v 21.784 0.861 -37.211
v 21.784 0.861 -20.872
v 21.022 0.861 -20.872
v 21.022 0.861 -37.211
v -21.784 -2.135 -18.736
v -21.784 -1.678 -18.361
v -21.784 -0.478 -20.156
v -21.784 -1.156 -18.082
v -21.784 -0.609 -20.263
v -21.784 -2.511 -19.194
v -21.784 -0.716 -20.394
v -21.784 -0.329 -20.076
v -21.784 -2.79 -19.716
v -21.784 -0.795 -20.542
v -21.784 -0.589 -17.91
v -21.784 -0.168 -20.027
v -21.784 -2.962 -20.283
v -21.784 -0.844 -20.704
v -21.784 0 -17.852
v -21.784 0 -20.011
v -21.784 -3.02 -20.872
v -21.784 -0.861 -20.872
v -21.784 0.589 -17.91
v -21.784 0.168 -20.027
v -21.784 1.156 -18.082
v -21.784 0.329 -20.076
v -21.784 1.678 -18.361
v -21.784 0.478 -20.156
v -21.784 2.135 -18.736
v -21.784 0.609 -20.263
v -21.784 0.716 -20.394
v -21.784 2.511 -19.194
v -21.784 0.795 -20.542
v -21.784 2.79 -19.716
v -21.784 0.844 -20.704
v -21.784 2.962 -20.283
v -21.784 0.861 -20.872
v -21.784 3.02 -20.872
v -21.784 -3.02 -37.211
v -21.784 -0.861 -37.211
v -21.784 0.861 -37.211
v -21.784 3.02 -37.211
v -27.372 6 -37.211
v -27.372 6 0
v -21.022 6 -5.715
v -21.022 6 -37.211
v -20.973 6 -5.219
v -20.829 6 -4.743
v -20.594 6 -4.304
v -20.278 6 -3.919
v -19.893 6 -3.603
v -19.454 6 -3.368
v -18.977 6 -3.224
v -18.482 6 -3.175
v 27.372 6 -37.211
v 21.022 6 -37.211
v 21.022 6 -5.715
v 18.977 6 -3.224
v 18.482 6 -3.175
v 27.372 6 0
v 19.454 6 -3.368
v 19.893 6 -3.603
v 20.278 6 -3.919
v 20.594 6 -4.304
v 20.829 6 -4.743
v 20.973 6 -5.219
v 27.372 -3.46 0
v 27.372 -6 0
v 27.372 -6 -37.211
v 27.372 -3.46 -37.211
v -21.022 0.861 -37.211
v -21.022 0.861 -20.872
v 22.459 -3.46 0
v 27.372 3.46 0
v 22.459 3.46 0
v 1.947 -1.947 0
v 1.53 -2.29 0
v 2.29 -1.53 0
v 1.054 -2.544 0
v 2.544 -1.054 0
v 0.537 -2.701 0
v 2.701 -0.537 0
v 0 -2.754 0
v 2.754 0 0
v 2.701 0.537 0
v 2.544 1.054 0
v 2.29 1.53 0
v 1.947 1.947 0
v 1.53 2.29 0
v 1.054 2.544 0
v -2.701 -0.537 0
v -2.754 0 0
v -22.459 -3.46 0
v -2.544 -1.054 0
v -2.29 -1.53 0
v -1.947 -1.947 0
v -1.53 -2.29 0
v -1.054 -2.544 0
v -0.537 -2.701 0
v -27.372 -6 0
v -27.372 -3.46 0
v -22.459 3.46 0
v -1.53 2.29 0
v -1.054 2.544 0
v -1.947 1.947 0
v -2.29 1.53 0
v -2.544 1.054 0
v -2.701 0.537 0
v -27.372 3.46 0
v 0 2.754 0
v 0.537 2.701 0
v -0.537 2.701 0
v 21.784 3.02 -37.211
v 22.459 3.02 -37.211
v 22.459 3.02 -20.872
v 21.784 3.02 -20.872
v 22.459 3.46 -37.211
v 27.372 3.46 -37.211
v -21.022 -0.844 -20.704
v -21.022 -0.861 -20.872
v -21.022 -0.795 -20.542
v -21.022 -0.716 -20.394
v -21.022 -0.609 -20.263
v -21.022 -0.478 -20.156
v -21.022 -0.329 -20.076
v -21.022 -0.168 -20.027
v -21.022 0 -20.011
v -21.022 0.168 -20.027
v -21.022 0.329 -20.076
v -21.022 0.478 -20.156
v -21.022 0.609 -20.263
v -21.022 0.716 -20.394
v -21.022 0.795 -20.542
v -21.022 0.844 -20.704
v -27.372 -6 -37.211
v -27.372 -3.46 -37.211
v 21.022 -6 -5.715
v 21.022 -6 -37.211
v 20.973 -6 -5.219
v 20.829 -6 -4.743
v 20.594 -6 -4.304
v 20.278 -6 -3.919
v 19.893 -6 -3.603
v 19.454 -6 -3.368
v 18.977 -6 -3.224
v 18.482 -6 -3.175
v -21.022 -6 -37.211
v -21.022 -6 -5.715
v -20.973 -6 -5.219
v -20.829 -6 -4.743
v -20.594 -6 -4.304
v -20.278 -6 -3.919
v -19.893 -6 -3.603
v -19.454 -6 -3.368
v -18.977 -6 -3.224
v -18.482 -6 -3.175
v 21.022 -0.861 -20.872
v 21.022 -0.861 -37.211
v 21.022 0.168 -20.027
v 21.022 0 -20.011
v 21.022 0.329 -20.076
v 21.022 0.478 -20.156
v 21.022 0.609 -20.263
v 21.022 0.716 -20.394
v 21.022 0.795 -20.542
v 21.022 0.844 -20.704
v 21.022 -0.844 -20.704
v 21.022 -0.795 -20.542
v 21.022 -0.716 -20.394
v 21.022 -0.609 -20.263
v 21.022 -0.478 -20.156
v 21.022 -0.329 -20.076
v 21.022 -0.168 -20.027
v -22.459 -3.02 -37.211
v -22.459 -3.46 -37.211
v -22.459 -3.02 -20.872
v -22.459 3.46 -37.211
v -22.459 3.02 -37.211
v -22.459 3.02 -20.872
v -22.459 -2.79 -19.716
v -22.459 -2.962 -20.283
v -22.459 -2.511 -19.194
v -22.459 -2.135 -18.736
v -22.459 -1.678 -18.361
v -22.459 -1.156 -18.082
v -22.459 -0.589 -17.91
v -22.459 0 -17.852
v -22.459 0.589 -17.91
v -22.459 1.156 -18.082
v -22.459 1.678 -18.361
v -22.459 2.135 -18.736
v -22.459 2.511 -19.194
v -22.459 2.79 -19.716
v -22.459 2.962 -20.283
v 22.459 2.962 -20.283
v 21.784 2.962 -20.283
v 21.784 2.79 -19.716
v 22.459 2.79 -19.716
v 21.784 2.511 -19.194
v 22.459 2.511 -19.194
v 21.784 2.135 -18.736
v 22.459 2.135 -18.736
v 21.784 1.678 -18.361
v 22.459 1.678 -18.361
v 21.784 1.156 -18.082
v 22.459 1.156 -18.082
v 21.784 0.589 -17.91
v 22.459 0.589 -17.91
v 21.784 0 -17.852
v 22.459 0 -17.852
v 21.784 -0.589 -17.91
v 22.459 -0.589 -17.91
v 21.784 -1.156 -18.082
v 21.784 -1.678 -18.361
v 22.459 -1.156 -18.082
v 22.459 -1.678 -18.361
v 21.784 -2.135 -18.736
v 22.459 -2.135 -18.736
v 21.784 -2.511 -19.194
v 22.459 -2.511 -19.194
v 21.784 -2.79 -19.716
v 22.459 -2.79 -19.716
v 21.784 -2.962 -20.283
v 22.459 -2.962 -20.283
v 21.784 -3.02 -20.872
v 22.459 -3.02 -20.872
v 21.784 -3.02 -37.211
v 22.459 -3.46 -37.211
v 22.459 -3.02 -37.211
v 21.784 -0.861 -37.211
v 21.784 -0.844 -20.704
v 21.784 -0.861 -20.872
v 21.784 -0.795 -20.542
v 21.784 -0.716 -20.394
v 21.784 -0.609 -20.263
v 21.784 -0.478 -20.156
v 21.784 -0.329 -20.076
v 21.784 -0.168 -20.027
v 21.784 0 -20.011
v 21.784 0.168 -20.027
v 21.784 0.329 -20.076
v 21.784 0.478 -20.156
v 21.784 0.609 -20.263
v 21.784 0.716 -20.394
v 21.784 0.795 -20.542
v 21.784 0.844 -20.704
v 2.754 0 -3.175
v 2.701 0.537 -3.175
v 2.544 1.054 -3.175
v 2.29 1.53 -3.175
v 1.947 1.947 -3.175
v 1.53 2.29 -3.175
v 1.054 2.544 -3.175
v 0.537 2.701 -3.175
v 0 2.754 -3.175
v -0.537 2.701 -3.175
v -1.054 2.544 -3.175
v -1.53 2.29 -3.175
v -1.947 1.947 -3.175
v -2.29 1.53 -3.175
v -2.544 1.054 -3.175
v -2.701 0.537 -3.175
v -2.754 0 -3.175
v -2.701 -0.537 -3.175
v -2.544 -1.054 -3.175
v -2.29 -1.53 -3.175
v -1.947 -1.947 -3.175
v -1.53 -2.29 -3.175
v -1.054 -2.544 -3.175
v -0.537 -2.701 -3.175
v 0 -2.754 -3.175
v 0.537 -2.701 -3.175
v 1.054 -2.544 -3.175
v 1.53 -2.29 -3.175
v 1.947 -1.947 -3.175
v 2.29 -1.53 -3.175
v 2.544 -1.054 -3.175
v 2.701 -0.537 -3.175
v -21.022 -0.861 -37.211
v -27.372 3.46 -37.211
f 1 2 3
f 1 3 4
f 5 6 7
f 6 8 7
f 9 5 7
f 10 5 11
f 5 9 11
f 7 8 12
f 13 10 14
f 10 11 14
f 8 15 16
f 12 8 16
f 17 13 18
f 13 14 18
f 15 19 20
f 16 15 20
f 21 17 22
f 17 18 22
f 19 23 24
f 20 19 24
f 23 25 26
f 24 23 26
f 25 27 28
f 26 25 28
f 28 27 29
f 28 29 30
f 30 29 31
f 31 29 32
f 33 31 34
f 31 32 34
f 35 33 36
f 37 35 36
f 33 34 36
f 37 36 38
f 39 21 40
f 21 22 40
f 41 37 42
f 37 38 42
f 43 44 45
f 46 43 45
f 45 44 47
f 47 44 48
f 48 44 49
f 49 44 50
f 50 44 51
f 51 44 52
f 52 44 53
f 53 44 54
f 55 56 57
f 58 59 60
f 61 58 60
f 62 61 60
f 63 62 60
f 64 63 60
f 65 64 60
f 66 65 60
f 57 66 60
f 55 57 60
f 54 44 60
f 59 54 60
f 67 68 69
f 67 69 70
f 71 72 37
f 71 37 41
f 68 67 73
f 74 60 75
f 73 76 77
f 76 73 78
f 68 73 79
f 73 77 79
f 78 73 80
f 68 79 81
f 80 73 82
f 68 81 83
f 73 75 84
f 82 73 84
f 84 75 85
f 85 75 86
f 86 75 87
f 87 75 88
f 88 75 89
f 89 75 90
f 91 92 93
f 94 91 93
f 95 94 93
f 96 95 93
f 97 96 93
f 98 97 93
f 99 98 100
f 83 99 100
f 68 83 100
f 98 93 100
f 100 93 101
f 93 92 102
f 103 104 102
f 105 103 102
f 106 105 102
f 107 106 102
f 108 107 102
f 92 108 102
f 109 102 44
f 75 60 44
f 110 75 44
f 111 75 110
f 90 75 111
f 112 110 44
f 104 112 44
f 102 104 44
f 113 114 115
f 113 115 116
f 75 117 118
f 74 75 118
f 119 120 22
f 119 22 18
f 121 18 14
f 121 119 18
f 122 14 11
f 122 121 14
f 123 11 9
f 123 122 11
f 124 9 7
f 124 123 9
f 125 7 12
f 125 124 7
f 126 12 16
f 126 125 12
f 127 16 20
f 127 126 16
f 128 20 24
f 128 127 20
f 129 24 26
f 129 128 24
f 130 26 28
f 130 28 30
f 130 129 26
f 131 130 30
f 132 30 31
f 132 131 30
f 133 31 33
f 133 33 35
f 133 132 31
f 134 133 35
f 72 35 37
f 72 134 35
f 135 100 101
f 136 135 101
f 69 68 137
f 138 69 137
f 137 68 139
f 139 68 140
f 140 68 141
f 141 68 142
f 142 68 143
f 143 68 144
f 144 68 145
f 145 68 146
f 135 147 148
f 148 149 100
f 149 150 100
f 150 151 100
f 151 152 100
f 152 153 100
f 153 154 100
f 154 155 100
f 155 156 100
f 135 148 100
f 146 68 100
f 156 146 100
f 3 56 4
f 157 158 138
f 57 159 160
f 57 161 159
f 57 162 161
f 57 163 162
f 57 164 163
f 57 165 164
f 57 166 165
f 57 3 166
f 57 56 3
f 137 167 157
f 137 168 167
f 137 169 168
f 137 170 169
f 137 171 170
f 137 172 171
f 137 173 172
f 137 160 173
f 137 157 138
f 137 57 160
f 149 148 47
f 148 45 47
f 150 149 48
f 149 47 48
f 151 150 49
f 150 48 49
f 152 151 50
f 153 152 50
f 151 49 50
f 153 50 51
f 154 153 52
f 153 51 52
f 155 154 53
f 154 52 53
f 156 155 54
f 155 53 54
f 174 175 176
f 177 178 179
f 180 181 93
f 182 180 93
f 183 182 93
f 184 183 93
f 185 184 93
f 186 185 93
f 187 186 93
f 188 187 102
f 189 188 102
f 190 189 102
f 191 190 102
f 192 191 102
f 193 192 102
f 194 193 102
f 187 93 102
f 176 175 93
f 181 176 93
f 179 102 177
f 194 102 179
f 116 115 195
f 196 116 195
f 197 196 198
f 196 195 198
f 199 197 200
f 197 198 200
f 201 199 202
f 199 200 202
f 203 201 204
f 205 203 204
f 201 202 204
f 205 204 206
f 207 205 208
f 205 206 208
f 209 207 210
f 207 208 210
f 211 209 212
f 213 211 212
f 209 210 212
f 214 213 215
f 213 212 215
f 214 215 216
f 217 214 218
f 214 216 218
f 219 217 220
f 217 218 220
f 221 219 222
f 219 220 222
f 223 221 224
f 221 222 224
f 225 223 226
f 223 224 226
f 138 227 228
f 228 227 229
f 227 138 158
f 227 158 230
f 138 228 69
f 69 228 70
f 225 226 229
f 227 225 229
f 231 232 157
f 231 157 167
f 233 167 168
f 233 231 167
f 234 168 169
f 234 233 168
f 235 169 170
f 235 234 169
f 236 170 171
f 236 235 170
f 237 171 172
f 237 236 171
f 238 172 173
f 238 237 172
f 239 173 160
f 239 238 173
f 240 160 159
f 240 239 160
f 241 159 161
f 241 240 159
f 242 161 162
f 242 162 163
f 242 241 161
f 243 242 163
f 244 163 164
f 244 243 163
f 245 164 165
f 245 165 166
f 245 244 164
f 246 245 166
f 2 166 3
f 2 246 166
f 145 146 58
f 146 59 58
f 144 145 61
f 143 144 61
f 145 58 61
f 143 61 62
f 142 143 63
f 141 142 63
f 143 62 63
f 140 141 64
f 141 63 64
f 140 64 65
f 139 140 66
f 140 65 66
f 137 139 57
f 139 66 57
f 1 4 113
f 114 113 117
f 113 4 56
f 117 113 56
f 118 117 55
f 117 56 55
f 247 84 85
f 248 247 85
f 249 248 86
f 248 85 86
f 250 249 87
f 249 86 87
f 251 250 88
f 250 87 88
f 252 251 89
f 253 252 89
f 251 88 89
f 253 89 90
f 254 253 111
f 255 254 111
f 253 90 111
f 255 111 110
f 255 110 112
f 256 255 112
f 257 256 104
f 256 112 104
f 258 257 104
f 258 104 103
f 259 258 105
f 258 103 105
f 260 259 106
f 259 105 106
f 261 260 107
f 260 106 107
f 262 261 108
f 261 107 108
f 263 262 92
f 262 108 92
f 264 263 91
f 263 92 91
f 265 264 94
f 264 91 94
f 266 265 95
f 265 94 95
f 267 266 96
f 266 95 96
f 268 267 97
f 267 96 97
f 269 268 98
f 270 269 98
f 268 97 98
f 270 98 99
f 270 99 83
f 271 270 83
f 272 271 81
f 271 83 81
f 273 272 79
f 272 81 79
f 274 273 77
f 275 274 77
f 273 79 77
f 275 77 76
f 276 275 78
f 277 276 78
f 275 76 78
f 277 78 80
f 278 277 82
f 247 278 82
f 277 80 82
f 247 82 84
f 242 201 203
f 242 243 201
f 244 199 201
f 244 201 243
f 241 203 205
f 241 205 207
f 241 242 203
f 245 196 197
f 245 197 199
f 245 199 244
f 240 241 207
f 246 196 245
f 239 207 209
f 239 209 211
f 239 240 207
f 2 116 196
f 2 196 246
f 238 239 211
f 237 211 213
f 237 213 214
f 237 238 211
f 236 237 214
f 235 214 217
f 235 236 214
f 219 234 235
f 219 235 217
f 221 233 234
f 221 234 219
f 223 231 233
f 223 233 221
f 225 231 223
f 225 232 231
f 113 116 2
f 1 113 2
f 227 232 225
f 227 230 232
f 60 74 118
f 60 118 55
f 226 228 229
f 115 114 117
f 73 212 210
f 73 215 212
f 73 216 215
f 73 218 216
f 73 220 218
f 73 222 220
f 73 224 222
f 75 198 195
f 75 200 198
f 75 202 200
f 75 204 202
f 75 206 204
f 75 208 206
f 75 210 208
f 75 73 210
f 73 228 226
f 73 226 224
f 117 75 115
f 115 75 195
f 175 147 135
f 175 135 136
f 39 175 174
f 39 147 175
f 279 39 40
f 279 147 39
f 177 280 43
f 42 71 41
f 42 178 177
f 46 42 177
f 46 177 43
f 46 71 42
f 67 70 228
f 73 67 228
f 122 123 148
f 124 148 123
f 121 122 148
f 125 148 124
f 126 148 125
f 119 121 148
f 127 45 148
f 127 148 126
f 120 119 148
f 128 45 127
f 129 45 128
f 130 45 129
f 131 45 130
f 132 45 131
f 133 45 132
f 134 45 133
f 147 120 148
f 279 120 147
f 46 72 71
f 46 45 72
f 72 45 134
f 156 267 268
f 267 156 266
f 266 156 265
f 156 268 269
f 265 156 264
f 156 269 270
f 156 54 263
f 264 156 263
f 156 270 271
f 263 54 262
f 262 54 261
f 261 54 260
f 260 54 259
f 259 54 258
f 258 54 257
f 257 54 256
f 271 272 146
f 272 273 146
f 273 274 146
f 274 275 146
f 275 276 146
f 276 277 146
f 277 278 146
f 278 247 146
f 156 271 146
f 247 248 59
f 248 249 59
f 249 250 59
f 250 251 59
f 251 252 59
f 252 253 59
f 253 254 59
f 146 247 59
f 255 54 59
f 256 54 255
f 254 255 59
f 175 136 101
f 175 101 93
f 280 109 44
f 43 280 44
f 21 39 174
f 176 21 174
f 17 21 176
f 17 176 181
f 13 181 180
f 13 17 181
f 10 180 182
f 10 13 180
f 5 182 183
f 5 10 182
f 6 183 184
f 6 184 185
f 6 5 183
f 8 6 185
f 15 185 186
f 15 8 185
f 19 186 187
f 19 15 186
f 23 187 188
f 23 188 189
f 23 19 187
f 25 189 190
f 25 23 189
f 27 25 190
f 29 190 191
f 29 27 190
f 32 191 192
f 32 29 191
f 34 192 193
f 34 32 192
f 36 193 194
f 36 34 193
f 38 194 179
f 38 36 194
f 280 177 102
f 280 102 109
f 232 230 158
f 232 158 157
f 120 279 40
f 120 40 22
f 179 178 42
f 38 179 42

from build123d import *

# Parameters (mm, degrees)
SKETCH1_W           = 42.04380551
SKETCH1_H           = 12
SKETCH1_R           = 2.754
BOSS_EXTRUDE1_DEPTH = 3.175
BOSS_EXTRUDE2_DEPTH = 37.211
CUT_EXTRUDE1_DEPTH  = 63.479858345
CUT_EXTRUDE2_DEPTH  = 0.67464881
CUT_EXTRUDE3_START  = -0.67464881
CUT_EXTRUDE3_DEPTH  = 0.67464881
FILLET1_R           = 2.54
CUT_EXTRUDE4_DEPTH  = 9.906
BOSS_EXTRUDE3_DEPTH = 0.762
BOSS_EXTRUDE4_START = -0.762
BOSS_EXTRUDE4_DEPTH = 0.762


with BuildPart() as part:
    # Sketch1 → Boss-Extrude1 (new body)
    with BuildSketch(Plane.XY):
        Rectangle(SKETCH1_W, SKETCH1_H)
        Circle(SKETCH1_R, mode=Mode.SUBTRACT)
    extrude(amount=-BOSS_EXTRUDE1_DEPTH)

    # Sketch2 → Boss-Extrude2 (add)
    with BuildSketch(Plane.XY):
        Polygon((27.371902755, 3.46), (27.371902755, 6), (21.021902755, 6), (21.021902755, -6), (27.371902755, -6), (27.371902755, -3.46), (22.458551565, -3.46), (22.458551565, 3.46), align=None)
    boss_extrude2 = extrude(amount=-BOSS_EXTRUDE2_DEPTH)

    # Mirror1: Boss-Extrude2 across plane
    add(boss_extrude2.mirror(Plane(origin=(0, 0, 0), x_dir=(0, 0, 1), z_dir=(1, 0, 0))))

    # Sketch3 → Cut-Extrude1 (cut, through all)
    with BuildSketch(Plane(origin=(22.458551565, 0, 0), x_dir=(0, 0, -1), z_dir=(1, 0, 0))):
        with BuildLine():
            Line((31.771902755, 1.75), (20.871902755, 1.75))
            ThreePointArc((20.871902755, 1.75), (19.121902755, 0), (20.871902755, -1.75))
            Line((20.871902755, -1.75), (31.771902755, -1.75))
            ThreePointArc((31.771902755, -1.75), (33.521902755, 0), (31.771902755, 1.75))
        make_face()
    extrude(amount=-CUT_EXTRUDE1_DEPTH, mode=Mode.SUBTRACT)

    # Sketch4 → Cut-Extrude2 (cut)
    with BuildSketch(Plane(origin=(22.458551565, 0, 0), x_dir=(0, 0, -1), z_dir=(1, 0, 0))):
        with BuildLine():
            Line((31.771902755, 3.02), (20.871902755, 3.02))
            ThreePointArc((20.871902755, 3.02), (17.851902755, 0), (20.871902755, -3.02))
            Line((20.871902755, -3.02), (31.771902755, -3.02))
            ThreePointArc((31.771902755, -3.02), (34.791902755, 0), (31.771902755, 3.02))
        make_face()
    extrude(amount=-CUT_EXTRUDE2_DEPTH, mode=Mode.SUBTRACT)

    # Sketch5 → Cut-Extrude3 (cut)
    with BuildSketch(Plane.ZY.offset(22.458551565).offset(CUT_EXTRUDE3_START)):
        with BuildLine():
            Line((-20.871902755, 3.02), (-31.771902755, 3.02))
            ThreePointArc((-31.771902755, 3.02), (-34.791902755, 0), (-31.771902755, -3.02))
            Line((-31.771902755, -3.02), (-20.871902755, -3.02))
            ThreePointArc((-20.871902755, -3.02), (-17.851902755, 0), (-20.871902755, 3.02))
        make_face()
    extrude(amount=CUT_EXTRUDE3_DEPTH, mode=Mode.SUBTRACT)

    # Fillet1
    fillet1_edges = [part.edges().sort_by_distance(p)[0] for p in [
        (-21.021902755, 0, -3.175),
        (21.021902755, 0, -3.175),
    ]]
    fillet(fillet1_edges, radius=FILLET1_R)

    # Sketch6 → Cut-Extrude4 (cut)
    with BuildSketch(Plane(origin=(0, 0, -37.211), x_dir=(-1, 0, 0), z_dir=(0, 0, -1))):
        Polygon((-21.783902755, -3.02), (-22.458551565, -3.02), (-22.458551565, 3.02), (-21.783902755, 3.02), (-21.783902755, 1.75), (-21.021902755, 1.75), (-21.021902755, -1.75), (-21.783902755, -1.75), align=None)
    cut_extrude4 = extrude(amount=-CUT_EXTRUDE4_DEPTH, mode=Mode.SUBTRACT)

    # Mirror2: Cut-Extrude4 across plane
    add(cut_extrude4.mirror(Plane(origin=(0, 0, 0), x_dir=(0, 0, 1), z_dir=(1, 0, 0))), mode=Mode.SUBTRACT)

    # Sketch8 → Boss-Extrude3 (add)
    with BuildSketch(Plane(origin=(-21.021902755, 0, 0), x_dir=(0, 0, -1), z_dir=(1, 0, 0))):
        with BuildLine():
            Line((20.871902755, 0.861), (37.211, 0.861))
            Line((37.211, 0.861), (37.211, 1.75))
            Line((37.211, 1.75), (20.871902755, 1.75))
            ThreePointArc((20.871902755, 1.75), (19.121902755, 0), (20.871902755, -1.75))
            Line((20.871902755, -1.75), (37.211, -1.75))
            Line((37.211, -1.75), (37.211, -0.861))
            Line((37.211, -0.861), (20.871902755, -0.861))
            ThreePointArc((20.871902755, -0.861), (20.010902755, 0), (20.871902755, 0.861))
        make_face()
    extrude(amount=-BOSS_EXTRUDE3_DEPTH)

    # Sketch9 → Boss-Extrude4 (add)
    with BuildSketch(Plane.ZY.offset(-21.021902755).offset(BOSS_EXTRUDE4_START)):
        with BuildLine():
            Line((-20.871902755, -3.02), (-37.211, -3.02))
            Line((-37.211, -3.02), (-37.211, -0.861))
            Line((-37.211, -0.861), (-20.871902755, -0.861))
            ThreePointArc((-20.871902755, -0.861), (-20.010902755, 0), (-20.871902755, 0.861))
            Line((-20.871902755, 0.861), (-37.211, 0.861))
            Line((-37.211, 0.861), (-37.211, 3.02))
            Line((-37.211, 3.02), (-20.871902755, 3.02))
            ThreePointArc((-20.871902755, 3.02), (-17.851902755, 0), (-20.871902755, -3.02))
        make_face()
    extrude(amount=BOSS_EXTRUDE4_DEPTH)


solid = part.part
